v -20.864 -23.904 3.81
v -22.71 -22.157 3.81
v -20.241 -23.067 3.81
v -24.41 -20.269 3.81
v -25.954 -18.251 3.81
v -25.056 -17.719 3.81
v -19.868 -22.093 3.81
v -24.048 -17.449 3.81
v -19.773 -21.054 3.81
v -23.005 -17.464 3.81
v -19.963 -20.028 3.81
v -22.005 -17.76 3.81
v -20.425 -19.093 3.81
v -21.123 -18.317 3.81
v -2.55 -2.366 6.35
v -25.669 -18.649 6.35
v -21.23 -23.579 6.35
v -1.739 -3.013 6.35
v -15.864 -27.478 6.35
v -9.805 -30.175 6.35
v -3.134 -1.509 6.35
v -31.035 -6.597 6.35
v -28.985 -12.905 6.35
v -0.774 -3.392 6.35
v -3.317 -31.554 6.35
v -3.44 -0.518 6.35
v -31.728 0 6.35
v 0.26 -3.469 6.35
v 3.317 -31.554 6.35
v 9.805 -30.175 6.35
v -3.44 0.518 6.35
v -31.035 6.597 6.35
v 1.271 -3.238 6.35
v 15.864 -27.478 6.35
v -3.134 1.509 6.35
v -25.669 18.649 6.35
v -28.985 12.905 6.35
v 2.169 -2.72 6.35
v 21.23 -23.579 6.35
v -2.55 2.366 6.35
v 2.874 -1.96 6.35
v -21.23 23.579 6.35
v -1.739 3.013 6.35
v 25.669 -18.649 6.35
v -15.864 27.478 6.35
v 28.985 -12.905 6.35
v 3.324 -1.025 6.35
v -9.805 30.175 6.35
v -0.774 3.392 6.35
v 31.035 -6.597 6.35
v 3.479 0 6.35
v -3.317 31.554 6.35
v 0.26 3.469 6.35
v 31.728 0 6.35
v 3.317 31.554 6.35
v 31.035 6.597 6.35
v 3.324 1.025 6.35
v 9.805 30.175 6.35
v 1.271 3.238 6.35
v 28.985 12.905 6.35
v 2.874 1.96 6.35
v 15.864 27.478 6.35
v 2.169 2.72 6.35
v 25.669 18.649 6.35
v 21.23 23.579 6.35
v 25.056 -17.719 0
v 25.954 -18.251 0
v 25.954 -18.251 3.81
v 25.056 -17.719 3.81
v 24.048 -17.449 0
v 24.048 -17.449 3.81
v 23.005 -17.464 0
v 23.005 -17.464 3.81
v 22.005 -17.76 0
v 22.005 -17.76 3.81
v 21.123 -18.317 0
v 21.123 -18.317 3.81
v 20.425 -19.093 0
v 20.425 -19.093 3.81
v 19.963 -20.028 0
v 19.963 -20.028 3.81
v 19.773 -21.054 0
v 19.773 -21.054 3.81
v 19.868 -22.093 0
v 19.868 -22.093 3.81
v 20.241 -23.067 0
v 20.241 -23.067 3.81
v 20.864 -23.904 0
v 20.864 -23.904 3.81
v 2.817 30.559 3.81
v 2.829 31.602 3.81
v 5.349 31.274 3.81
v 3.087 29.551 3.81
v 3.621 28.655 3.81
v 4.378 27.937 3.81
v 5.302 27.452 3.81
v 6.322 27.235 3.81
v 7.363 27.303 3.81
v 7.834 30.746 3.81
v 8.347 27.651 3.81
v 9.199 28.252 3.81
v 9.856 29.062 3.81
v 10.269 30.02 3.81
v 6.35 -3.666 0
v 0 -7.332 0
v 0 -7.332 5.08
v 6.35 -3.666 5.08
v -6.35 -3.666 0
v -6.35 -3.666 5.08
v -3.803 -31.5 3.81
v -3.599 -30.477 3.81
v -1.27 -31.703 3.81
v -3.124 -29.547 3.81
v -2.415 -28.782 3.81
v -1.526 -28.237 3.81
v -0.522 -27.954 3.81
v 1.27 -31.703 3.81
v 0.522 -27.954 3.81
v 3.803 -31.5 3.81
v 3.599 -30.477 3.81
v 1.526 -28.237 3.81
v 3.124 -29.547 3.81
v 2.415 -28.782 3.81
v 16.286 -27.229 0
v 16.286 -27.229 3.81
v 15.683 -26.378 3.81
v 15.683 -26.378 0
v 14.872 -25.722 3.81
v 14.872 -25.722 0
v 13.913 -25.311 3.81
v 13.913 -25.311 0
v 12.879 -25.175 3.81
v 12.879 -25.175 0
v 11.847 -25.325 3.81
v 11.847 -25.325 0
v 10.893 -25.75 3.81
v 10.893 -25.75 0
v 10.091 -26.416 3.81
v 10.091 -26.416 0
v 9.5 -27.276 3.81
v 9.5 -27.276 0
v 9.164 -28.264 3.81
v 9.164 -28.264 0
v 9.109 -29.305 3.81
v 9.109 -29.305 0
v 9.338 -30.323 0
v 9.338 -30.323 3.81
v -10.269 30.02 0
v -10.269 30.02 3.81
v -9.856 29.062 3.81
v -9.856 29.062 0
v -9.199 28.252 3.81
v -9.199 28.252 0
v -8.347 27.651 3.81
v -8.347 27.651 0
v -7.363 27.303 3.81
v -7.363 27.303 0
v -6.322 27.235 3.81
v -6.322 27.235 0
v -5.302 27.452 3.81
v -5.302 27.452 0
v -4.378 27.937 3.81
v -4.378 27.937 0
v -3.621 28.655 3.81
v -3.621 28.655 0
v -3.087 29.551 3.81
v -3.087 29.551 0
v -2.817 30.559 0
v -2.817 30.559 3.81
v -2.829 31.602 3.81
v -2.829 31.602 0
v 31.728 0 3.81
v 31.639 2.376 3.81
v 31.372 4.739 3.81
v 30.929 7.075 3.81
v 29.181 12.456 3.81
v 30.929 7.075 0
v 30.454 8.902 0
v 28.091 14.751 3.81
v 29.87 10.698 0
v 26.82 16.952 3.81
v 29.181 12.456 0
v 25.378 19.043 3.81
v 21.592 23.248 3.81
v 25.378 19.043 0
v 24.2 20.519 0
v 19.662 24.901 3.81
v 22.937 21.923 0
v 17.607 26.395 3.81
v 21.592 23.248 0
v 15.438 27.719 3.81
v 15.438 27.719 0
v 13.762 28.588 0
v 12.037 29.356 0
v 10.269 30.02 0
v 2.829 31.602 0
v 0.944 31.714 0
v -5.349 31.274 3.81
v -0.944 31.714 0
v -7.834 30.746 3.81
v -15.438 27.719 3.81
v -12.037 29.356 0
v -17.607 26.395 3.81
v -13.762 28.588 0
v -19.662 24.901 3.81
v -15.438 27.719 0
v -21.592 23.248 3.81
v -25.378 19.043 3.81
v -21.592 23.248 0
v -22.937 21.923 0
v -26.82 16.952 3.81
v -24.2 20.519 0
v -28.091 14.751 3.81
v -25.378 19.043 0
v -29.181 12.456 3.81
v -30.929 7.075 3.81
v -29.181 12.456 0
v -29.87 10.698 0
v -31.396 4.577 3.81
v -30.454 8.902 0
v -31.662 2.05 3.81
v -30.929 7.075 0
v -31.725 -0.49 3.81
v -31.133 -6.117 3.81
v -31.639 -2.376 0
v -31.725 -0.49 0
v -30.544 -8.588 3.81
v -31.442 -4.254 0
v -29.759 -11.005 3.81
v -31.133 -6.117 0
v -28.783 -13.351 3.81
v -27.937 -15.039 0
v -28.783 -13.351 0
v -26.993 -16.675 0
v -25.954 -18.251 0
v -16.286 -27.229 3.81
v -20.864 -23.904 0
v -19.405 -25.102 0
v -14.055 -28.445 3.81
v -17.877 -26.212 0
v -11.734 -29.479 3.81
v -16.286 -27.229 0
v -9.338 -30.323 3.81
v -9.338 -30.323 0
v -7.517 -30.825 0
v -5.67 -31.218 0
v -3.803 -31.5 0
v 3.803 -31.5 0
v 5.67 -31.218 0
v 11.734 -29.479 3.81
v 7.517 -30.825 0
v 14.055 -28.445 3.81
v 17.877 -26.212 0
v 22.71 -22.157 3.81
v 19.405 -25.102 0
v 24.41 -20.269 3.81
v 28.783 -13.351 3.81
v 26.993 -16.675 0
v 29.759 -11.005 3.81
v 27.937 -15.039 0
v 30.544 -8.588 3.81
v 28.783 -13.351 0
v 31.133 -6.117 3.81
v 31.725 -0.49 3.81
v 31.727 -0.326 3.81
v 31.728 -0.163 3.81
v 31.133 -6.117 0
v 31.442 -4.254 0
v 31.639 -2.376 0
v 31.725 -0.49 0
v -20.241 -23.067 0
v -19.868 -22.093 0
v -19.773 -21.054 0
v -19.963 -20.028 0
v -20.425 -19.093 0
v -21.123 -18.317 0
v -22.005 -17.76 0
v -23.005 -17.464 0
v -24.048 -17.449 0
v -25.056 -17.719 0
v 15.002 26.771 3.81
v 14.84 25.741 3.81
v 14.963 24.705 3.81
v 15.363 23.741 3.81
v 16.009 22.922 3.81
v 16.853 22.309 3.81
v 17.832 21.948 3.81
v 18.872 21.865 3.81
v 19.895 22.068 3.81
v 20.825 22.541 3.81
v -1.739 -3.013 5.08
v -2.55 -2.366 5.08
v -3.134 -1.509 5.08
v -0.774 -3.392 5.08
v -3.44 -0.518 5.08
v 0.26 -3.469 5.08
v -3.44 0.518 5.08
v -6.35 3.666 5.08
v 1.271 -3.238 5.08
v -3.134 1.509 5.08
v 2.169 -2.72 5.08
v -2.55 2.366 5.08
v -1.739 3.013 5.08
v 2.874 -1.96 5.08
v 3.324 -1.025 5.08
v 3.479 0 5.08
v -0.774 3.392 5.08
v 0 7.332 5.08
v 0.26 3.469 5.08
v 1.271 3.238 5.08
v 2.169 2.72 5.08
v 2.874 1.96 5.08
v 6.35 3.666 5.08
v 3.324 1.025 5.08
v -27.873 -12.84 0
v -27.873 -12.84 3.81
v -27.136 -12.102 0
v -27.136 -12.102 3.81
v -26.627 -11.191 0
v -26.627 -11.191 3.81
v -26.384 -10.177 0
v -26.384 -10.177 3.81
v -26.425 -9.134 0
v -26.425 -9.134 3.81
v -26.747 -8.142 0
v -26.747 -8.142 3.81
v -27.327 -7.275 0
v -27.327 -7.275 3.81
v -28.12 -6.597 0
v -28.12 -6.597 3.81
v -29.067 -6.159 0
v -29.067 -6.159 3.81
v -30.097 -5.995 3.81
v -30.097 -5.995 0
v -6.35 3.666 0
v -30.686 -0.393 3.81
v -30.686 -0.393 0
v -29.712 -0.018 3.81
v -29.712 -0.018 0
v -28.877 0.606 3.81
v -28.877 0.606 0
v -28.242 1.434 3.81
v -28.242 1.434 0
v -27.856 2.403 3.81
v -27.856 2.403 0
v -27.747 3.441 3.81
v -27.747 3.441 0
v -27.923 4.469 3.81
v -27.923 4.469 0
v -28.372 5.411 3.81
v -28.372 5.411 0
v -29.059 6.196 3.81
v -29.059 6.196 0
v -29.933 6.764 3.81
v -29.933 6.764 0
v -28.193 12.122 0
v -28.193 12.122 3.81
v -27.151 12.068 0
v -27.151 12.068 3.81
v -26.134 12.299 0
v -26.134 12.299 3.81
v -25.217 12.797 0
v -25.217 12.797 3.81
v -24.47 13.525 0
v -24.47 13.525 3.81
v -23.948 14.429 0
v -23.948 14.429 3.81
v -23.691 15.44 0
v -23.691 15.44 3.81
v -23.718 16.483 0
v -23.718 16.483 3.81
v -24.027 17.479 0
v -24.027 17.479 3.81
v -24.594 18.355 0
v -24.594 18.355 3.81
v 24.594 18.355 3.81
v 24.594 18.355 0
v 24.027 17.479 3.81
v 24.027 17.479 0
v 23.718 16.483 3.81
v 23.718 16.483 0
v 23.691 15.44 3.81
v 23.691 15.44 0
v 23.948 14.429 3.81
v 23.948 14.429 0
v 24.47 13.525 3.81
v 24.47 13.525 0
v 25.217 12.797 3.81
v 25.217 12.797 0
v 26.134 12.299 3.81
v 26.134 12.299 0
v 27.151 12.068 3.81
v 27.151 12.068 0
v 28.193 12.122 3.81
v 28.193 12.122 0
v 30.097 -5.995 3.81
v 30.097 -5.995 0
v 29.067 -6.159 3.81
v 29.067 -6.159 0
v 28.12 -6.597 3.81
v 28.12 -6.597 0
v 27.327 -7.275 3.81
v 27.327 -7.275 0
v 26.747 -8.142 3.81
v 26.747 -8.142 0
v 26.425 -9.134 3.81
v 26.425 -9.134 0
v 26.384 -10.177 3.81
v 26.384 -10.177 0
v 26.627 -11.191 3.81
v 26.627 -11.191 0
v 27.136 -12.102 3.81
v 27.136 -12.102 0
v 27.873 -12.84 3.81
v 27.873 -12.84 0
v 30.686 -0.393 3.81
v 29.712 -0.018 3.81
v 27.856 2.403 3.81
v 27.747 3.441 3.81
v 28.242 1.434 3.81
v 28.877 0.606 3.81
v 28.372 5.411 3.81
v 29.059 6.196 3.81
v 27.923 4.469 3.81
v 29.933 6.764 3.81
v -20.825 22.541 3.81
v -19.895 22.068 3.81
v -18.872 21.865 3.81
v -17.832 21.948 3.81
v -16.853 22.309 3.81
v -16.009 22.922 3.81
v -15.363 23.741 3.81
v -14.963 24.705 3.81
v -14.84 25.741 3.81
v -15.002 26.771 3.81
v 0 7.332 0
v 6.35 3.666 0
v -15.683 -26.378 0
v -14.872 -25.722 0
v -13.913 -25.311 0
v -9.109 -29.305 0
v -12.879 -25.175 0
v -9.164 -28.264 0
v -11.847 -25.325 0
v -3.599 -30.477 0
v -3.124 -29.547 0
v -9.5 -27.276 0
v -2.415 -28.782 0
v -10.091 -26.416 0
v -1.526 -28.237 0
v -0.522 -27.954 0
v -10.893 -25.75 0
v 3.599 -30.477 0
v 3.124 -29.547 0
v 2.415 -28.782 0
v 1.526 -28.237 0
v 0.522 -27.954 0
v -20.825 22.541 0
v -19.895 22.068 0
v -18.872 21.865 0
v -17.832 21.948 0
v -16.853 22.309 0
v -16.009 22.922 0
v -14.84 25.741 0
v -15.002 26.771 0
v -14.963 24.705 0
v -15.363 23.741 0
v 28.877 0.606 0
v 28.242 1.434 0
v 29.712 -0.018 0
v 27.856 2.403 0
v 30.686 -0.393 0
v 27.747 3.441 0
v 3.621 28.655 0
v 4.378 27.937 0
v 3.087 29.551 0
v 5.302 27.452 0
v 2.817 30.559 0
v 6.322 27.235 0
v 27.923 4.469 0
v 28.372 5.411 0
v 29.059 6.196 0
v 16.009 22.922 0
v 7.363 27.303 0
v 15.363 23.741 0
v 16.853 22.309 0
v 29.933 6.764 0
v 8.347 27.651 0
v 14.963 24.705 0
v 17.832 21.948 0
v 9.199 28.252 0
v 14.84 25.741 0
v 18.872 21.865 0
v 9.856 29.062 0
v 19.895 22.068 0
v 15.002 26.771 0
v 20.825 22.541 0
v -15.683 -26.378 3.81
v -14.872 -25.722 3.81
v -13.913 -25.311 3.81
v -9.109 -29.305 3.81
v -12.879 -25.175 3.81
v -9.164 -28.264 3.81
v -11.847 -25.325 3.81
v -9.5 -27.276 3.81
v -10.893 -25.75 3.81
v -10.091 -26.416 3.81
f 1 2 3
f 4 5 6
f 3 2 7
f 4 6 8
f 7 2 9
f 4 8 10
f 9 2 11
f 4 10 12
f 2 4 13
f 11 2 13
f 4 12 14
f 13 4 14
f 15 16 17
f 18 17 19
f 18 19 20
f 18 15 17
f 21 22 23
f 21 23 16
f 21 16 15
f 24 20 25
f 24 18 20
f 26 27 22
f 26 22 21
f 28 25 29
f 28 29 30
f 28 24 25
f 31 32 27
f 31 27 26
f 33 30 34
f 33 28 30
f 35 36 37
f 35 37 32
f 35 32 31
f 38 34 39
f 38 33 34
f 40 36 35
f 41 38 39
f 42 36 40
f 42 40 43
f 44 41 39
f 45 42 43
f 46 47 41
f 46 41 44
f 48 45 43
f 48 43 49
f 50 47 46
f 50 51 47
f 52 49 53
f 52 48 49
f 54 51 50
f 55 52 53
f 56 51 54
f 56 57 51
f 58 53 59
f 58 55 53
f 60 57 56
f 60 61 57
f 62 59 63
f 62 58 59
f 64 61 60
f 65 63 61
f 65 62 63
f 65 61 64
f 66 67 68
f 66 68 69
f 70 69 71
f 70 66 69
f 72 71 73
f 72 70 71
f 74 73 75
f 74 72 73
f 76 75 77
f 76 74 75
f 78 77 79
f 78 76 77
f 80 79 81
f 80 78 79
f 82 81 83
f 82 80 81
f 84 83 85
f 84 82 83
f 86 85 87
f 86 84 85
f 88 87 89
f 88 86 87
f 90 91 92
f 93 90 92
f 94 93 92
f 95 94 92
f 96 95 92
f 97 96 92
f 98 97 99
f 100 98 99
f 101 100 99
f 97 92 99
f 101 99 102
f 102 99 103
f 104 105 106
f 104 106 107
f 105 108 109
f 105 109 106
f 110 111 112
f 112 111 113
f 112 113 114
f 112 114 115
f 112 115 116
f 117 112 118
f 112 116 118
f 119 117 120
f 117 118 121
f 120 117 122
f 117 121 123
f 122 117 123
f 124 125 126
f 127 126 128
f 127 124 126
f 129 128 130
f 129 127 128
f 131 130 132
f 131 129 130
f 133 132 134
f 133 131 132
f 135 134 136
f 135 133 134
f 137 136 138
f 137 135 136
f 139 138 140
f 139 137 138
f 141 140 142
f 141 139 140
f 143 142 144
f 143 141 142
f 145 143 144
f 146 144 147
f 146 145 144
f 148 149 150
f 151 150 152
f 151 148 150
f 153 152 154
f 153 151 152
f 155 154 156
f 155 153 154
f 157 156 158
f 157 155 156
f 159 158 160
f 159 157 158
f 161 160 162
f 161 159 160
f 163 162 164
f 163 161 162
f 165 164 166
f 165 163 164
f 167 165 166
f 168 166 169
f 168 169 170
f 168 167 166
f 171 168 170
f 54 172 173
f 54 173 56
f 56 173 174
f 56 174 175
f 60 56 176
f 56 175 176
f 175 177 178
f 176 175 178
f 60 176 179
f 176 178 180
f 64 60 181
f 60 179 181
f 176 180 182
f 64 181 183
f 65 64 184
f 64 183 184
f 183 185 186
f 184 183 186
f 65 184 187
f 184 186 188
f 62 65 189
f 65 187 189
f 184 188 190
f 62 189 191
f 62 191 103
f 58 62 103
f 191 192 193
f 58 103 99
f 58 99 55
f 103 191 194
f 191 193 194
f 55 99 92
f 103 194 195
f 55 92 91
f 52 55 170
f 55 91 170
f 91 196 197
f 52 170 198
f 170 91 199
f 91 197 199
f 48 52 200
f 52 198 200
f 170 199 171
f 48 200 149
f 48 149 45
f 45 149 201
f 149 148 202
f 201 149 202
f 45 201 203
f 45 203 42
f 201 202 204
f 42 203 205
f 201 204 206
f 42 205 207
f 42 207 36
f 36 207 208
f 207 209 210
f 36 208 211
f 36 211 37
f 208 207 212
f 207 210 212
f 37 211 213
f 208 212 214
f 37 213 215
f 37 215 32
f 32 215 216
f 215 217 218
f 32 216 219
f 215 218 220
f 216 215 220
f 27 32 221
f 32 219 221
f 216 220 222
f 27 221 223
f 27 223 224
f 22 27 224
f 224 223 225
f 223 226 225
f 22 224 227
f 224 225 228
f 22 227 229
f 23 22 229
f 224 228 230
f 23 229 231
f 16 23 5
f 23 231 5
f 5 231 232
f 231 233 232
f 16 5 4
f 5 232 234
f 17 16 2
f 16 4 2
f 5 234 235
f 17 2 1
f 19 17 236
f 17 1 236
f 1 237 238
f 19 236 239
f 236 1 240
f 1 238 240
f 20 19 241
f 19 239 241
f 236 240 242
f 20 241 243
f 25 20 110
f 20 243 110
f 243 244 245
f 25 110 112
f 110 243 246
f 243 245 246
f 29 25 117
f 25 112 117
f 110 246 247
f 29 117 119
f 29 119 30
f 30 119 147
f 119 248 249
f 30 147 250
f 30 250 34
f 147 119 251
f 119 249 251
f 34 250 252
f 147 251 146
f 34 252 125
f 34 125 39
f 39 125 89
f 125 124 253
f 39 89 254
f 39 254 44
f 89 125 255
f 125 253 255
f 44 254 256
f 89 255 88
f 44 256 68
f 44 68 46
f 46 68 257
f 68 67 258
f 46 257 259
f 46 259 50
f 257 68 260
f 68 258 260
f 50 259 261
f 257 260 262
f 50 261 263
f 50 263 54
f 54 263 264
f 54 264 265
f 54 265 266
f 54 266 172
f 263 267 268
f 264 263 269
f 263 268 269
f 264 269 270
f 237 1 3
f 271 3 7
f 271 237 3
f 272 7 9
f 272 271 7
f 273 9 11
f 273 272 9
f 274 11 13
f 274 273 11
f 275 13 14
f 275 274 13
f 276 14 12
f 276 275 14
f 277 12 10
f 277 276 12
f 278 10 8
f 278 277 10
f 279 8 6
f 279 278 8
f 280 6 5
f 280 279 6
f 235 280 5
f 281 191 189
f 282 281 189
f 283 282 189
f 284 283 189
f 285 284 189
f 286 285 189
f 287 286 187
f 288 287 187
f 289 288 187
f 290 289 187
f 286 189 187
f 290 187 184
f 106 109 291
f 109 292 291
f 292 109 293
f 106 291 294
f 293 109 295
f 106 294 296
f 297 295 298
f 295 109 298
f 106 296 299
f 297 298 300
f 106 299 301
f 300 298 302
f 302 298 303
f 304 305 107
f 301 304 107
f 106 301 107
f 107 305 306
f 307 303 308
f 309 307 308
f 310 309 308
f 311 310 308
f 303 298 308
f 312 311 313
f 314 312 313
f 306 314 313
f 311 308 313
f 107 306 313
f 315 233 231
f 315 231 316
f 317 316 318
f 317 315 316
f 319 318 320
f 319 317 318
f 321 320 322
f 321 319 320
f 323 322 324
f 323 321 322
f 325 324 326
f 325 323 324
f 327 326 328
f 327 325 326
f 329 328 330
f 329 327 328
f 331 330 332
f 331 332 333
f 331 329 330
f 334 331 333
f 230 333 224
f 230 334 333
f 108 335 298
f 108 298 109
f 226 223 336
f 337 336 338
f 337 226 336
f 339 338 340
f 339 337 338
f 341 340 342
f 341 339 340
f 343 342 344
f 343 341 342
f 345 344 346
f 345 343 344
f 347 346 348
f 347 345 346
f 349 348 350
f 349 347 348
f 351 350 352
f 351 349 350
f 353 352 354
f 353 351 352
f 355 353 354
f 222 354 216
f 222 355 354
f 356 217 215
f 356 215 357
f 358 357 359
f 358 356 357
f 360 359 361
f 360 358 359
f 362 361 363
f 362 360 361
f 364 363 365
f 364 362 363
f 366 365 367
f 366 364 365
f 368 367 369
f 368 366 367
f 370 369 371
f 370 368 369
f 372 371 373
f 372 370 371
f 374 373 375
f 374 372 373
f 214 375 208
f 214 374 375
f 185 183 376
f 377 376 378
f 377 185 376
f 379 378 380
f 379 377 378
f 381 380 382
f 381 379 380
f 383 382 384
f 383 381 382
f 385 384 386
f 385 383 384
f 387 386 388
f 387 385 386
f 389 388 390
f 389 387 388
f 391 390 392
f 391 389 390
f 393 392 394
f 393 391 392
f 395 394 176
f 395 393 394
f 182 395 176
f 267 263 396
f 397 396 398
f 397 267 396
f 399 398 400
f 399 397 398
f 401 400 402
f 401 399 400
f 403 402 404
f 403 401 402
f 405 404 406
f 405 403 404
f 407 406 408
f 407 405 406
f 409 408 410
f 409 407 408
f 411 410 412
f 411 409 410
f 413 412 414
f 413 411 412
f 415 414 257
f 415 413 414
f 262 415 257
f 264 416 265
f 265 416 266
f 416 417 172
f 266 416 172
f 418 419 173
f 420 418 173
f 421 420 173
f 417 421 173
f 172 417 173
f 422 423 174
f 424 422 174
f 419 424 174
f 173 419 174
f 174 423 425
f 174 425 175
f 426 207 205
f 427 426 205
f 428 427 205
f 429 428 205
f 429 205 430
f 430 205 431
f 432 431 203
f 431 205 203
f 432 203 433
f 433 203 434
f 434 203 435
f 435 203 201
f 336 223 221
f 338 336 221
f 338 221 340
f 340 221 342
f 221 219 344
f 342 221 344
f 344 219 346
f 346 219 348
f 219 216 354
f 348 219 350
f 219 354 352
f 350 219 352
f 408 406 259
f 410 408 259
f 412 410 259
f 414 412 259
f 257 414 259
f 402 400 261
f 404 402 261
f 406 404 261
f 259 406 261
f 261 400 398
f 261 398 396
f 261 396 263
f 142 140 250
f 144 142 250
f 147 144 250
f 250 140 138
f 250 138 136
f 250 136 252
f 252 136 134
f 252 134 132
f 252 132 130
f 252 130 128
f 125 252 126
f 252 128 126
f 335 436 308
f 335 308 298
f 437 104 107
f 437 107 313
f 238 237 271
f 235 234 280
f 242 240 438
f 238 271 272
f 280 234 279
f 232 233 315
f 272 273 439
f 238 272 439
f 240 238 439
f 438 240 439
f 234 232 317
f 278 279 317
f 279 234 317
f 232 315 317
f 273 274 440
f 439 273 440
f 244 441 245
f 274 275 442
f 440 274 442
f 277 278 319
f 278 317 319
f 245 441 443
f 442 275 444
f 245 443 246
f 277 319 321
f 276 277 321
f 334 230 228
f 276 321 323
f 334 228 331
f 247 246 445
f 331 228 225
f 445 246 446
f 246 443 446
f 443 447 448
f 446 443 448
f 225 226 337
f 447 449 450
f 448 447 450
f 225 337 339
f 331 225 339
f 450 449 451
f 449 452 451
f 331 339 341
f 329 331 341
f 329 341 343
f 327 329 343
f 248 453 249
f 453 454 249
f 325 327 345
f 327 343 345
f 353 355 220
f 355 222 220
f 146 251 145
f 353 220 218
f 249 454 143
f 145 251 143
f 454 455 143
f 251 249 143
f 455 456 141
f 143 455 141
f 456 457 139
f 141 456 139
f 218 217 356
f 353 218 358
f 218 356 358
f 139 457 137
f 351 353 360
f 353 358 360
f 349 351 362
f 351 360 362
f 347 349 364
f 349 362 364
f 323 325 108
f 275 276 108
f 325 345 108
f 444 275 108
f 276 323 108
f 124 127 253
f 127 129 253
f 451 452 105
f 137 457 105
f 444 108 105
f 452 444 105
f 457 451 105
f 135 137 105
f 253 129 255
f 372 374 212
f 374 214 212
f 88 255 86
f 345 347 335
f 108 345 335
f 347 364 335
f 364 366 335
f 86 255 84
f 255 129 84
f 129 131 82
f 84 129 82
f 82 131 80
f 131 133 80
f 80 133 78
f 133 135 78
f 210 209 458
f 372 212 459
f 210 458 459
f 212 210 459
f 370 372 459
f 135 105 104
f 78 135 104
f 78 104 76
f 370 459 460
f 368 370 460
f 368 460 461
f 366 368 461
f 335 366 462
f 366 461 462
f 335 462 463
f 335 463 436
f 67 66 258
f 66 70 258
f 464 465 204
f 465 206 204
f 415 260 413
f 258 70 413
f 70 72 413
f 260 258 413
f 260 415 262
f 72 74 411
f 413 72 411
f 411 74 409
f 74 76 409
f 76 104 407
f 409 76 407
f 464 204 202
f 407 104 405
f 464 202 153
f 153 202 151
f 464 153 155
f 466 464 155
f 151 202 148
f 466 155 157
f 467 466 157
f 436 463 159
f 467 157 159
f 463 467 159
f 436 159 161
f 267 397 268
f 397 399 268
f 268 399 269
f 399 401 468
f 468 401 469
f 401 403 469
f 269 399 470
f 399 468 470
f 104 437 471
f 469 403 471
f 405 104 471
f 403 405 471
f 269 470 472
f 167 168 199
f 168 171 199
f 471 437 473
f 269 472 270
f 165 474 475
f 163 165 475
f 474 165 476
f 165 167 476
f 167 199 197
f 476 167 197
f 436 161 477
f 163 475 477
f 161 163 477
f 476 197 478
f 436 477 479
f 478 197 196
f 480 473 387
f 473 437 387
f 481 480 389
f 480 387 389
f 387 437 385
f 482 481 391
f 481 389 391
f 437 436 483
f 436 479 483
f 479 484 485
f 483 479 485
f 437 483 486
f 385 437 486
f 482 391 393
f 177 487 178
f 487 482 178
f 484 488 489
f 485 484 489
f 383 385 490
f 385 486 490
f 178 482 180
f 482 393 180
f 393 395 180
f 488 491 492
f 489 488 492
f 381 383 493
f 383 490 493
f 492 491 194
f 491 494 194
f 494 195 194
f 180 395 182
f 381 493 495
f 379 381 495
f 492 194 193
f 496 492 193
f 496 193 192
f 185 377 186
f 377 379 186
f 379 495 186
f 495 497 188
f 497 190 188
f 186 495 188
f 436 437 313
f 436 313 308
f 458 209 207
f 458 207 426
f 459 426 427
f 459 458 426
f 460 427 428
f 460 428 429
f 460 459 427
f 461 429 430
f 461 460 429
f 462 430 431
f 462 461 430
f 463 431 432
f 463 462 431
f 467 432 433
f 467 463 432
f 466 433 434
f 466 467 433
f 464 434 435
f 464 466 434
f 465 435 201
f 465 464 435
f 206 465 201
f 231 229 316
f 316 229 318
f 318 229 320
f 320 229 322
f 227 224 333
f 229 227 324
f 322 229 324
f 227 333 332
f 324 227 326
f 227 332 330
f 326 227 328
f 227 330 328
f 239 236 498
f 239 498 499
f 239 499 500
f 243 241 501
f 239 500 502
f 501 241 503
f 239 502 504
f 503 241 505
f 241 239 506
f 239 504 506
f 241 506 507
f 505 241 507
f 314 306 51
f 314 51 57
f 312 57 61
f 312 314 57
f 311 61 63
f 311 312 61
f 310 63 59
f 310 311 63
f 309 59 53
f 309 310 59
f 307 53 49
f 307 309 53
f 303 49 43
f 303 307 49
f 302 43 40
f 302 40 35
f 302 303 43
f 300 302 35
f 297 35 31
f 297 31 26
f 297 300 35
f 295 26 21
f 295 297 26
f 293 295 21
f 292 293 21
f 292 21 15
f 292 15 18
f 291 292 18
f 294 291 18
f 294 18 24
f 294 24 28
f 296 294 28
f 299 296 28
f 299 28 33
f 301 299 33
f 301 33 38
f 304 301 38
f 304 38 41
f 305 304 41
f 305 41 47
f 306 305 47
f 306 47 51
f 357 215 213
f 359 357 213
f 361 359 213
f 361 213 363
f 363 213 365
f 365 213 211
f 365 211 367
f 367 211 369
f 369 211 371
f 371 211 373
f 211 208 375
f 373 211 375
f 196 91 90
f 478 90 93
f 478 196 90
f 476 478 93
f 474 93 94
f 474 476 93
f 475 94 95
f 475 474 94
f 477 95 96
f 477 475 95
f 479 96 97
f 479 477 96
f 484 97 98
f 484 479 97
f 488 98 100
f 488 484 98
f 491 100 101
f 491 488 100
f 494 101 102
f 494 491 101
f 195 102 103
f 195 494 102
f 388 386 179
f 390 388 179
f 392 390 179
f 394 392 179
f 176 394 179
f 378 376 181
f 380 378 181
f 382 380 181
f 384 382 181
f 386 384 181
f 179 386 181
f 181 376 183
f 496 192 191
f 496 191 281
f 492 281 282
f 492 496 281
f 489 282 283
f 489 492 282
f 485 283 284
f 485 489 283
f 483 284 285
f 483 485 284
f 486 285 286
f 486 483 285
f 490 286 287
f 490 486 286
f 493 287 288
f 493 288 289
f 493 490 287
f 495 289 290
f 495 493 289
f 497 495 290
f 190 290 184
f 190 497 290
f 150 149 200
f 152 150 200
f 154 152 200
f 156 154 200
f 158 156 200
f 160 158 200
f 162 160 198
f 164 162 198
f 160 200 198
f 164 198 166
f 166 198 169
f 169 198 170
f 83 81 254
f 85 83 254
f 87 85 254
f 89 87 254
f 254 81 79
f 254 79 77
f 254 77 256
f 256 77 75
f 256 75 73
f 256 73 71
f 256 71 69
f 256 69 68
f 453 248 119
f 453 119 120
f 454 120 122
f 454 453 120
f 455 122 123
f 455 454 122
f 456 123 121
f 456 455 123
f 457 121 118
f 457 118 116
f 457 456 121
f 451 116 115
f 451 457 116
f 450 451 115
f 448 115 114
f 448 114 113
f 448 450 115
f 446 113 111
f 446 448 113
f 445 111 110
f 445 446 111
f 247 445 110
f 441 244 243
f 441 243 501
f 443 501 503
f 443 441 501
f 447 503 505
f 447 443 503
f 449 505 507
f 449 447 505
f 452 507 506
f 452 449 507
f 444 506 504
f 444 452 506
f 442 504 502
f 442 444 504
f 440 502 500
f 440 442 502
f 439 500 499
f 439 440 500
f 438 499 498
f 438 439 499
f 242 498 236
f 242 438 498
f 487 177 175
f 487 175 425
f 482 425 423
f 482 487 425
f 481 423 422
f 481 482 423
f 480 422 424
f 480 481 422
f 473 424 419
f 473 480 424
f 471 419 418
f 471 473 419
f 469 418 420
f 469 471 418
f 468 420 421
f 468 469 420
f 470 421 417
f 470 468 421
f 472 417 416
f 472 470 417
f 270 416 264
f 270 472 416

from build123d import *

# Parameters (mm, degrees)
F0_R     = 31.728285
F0_R_2   = 3.478838
F1_DEPTH = 6.35
F3_DEPTH = 5.08
F4_R     = 3.81
F5_DEPTH = 3.81


with BuildPart() as f1:
    # F0 (on Top) → F1 (new body)
    with BuildSketch(Plane.XY):
        Circle(F0_R)
        Circle(F0_R_2, mode=Mode.SUBTRACT)
    extrude(amount=F1_DEPTH)

    # F2 (on Top) → F3 (cut)
    with BuildSketch(Plane.XY):
        Polygon((6.35, -3.666174), (6.35, 3.666174), (0, 7.332348), (-6.35, 3.666174), (-6.35, -3.666174), (0, -7.332348), align=None)
    extrude(amount=F3_DEPTH, mode=Mode.SUBTRACT)

    # F4 (on Top) → F5 (cut)
    with BuildSketch(Plane.XY):
        with Locations((0, -31.728285)):
            Circle(F4_R)
        with Locations((12.905056, -28.98523)):
            Circle(F4_R)
        with Locations((23.578711, -21.230366)):
            Circle(F4_R)
        with Locations((30.175392, -9.804579)):
            Circle(F4_R)
        with Locations((31.554474, 3.316509)):
            Circle(F4_R)
        with Locations((27.477501, 15.864142)):
            Circle(F4_R)
        with Locations((18.649418, 25.668721)):
            Circle(F4_R)
        with Locations((6.596681, 31.034946)):
            Circle(F4_R)
        with Locations((-6.596681, 31.034946)):
            Circle(F4_R)
        with Locations((-18.649418, 25.668721)):
            Circle(F4_R)
        with Locations((-27.477501, 15.864142)):
            Circle(F4_R)
        with Locations((-31.554474, 3.316509)):
            Circle(F4_R)
        with Locations((-30.175392, -9.804579)):
            Circle(F4_R)
        with Locations((-23.578711, -21.230366)):
            Circle(F4_R)
        with Locations((-12.905056, -28.98523)):
            Circle(F4_R)
    extrude(amount=F5_DEPTH, mode=Mode.SUBTRACT)


solid = f1.part
